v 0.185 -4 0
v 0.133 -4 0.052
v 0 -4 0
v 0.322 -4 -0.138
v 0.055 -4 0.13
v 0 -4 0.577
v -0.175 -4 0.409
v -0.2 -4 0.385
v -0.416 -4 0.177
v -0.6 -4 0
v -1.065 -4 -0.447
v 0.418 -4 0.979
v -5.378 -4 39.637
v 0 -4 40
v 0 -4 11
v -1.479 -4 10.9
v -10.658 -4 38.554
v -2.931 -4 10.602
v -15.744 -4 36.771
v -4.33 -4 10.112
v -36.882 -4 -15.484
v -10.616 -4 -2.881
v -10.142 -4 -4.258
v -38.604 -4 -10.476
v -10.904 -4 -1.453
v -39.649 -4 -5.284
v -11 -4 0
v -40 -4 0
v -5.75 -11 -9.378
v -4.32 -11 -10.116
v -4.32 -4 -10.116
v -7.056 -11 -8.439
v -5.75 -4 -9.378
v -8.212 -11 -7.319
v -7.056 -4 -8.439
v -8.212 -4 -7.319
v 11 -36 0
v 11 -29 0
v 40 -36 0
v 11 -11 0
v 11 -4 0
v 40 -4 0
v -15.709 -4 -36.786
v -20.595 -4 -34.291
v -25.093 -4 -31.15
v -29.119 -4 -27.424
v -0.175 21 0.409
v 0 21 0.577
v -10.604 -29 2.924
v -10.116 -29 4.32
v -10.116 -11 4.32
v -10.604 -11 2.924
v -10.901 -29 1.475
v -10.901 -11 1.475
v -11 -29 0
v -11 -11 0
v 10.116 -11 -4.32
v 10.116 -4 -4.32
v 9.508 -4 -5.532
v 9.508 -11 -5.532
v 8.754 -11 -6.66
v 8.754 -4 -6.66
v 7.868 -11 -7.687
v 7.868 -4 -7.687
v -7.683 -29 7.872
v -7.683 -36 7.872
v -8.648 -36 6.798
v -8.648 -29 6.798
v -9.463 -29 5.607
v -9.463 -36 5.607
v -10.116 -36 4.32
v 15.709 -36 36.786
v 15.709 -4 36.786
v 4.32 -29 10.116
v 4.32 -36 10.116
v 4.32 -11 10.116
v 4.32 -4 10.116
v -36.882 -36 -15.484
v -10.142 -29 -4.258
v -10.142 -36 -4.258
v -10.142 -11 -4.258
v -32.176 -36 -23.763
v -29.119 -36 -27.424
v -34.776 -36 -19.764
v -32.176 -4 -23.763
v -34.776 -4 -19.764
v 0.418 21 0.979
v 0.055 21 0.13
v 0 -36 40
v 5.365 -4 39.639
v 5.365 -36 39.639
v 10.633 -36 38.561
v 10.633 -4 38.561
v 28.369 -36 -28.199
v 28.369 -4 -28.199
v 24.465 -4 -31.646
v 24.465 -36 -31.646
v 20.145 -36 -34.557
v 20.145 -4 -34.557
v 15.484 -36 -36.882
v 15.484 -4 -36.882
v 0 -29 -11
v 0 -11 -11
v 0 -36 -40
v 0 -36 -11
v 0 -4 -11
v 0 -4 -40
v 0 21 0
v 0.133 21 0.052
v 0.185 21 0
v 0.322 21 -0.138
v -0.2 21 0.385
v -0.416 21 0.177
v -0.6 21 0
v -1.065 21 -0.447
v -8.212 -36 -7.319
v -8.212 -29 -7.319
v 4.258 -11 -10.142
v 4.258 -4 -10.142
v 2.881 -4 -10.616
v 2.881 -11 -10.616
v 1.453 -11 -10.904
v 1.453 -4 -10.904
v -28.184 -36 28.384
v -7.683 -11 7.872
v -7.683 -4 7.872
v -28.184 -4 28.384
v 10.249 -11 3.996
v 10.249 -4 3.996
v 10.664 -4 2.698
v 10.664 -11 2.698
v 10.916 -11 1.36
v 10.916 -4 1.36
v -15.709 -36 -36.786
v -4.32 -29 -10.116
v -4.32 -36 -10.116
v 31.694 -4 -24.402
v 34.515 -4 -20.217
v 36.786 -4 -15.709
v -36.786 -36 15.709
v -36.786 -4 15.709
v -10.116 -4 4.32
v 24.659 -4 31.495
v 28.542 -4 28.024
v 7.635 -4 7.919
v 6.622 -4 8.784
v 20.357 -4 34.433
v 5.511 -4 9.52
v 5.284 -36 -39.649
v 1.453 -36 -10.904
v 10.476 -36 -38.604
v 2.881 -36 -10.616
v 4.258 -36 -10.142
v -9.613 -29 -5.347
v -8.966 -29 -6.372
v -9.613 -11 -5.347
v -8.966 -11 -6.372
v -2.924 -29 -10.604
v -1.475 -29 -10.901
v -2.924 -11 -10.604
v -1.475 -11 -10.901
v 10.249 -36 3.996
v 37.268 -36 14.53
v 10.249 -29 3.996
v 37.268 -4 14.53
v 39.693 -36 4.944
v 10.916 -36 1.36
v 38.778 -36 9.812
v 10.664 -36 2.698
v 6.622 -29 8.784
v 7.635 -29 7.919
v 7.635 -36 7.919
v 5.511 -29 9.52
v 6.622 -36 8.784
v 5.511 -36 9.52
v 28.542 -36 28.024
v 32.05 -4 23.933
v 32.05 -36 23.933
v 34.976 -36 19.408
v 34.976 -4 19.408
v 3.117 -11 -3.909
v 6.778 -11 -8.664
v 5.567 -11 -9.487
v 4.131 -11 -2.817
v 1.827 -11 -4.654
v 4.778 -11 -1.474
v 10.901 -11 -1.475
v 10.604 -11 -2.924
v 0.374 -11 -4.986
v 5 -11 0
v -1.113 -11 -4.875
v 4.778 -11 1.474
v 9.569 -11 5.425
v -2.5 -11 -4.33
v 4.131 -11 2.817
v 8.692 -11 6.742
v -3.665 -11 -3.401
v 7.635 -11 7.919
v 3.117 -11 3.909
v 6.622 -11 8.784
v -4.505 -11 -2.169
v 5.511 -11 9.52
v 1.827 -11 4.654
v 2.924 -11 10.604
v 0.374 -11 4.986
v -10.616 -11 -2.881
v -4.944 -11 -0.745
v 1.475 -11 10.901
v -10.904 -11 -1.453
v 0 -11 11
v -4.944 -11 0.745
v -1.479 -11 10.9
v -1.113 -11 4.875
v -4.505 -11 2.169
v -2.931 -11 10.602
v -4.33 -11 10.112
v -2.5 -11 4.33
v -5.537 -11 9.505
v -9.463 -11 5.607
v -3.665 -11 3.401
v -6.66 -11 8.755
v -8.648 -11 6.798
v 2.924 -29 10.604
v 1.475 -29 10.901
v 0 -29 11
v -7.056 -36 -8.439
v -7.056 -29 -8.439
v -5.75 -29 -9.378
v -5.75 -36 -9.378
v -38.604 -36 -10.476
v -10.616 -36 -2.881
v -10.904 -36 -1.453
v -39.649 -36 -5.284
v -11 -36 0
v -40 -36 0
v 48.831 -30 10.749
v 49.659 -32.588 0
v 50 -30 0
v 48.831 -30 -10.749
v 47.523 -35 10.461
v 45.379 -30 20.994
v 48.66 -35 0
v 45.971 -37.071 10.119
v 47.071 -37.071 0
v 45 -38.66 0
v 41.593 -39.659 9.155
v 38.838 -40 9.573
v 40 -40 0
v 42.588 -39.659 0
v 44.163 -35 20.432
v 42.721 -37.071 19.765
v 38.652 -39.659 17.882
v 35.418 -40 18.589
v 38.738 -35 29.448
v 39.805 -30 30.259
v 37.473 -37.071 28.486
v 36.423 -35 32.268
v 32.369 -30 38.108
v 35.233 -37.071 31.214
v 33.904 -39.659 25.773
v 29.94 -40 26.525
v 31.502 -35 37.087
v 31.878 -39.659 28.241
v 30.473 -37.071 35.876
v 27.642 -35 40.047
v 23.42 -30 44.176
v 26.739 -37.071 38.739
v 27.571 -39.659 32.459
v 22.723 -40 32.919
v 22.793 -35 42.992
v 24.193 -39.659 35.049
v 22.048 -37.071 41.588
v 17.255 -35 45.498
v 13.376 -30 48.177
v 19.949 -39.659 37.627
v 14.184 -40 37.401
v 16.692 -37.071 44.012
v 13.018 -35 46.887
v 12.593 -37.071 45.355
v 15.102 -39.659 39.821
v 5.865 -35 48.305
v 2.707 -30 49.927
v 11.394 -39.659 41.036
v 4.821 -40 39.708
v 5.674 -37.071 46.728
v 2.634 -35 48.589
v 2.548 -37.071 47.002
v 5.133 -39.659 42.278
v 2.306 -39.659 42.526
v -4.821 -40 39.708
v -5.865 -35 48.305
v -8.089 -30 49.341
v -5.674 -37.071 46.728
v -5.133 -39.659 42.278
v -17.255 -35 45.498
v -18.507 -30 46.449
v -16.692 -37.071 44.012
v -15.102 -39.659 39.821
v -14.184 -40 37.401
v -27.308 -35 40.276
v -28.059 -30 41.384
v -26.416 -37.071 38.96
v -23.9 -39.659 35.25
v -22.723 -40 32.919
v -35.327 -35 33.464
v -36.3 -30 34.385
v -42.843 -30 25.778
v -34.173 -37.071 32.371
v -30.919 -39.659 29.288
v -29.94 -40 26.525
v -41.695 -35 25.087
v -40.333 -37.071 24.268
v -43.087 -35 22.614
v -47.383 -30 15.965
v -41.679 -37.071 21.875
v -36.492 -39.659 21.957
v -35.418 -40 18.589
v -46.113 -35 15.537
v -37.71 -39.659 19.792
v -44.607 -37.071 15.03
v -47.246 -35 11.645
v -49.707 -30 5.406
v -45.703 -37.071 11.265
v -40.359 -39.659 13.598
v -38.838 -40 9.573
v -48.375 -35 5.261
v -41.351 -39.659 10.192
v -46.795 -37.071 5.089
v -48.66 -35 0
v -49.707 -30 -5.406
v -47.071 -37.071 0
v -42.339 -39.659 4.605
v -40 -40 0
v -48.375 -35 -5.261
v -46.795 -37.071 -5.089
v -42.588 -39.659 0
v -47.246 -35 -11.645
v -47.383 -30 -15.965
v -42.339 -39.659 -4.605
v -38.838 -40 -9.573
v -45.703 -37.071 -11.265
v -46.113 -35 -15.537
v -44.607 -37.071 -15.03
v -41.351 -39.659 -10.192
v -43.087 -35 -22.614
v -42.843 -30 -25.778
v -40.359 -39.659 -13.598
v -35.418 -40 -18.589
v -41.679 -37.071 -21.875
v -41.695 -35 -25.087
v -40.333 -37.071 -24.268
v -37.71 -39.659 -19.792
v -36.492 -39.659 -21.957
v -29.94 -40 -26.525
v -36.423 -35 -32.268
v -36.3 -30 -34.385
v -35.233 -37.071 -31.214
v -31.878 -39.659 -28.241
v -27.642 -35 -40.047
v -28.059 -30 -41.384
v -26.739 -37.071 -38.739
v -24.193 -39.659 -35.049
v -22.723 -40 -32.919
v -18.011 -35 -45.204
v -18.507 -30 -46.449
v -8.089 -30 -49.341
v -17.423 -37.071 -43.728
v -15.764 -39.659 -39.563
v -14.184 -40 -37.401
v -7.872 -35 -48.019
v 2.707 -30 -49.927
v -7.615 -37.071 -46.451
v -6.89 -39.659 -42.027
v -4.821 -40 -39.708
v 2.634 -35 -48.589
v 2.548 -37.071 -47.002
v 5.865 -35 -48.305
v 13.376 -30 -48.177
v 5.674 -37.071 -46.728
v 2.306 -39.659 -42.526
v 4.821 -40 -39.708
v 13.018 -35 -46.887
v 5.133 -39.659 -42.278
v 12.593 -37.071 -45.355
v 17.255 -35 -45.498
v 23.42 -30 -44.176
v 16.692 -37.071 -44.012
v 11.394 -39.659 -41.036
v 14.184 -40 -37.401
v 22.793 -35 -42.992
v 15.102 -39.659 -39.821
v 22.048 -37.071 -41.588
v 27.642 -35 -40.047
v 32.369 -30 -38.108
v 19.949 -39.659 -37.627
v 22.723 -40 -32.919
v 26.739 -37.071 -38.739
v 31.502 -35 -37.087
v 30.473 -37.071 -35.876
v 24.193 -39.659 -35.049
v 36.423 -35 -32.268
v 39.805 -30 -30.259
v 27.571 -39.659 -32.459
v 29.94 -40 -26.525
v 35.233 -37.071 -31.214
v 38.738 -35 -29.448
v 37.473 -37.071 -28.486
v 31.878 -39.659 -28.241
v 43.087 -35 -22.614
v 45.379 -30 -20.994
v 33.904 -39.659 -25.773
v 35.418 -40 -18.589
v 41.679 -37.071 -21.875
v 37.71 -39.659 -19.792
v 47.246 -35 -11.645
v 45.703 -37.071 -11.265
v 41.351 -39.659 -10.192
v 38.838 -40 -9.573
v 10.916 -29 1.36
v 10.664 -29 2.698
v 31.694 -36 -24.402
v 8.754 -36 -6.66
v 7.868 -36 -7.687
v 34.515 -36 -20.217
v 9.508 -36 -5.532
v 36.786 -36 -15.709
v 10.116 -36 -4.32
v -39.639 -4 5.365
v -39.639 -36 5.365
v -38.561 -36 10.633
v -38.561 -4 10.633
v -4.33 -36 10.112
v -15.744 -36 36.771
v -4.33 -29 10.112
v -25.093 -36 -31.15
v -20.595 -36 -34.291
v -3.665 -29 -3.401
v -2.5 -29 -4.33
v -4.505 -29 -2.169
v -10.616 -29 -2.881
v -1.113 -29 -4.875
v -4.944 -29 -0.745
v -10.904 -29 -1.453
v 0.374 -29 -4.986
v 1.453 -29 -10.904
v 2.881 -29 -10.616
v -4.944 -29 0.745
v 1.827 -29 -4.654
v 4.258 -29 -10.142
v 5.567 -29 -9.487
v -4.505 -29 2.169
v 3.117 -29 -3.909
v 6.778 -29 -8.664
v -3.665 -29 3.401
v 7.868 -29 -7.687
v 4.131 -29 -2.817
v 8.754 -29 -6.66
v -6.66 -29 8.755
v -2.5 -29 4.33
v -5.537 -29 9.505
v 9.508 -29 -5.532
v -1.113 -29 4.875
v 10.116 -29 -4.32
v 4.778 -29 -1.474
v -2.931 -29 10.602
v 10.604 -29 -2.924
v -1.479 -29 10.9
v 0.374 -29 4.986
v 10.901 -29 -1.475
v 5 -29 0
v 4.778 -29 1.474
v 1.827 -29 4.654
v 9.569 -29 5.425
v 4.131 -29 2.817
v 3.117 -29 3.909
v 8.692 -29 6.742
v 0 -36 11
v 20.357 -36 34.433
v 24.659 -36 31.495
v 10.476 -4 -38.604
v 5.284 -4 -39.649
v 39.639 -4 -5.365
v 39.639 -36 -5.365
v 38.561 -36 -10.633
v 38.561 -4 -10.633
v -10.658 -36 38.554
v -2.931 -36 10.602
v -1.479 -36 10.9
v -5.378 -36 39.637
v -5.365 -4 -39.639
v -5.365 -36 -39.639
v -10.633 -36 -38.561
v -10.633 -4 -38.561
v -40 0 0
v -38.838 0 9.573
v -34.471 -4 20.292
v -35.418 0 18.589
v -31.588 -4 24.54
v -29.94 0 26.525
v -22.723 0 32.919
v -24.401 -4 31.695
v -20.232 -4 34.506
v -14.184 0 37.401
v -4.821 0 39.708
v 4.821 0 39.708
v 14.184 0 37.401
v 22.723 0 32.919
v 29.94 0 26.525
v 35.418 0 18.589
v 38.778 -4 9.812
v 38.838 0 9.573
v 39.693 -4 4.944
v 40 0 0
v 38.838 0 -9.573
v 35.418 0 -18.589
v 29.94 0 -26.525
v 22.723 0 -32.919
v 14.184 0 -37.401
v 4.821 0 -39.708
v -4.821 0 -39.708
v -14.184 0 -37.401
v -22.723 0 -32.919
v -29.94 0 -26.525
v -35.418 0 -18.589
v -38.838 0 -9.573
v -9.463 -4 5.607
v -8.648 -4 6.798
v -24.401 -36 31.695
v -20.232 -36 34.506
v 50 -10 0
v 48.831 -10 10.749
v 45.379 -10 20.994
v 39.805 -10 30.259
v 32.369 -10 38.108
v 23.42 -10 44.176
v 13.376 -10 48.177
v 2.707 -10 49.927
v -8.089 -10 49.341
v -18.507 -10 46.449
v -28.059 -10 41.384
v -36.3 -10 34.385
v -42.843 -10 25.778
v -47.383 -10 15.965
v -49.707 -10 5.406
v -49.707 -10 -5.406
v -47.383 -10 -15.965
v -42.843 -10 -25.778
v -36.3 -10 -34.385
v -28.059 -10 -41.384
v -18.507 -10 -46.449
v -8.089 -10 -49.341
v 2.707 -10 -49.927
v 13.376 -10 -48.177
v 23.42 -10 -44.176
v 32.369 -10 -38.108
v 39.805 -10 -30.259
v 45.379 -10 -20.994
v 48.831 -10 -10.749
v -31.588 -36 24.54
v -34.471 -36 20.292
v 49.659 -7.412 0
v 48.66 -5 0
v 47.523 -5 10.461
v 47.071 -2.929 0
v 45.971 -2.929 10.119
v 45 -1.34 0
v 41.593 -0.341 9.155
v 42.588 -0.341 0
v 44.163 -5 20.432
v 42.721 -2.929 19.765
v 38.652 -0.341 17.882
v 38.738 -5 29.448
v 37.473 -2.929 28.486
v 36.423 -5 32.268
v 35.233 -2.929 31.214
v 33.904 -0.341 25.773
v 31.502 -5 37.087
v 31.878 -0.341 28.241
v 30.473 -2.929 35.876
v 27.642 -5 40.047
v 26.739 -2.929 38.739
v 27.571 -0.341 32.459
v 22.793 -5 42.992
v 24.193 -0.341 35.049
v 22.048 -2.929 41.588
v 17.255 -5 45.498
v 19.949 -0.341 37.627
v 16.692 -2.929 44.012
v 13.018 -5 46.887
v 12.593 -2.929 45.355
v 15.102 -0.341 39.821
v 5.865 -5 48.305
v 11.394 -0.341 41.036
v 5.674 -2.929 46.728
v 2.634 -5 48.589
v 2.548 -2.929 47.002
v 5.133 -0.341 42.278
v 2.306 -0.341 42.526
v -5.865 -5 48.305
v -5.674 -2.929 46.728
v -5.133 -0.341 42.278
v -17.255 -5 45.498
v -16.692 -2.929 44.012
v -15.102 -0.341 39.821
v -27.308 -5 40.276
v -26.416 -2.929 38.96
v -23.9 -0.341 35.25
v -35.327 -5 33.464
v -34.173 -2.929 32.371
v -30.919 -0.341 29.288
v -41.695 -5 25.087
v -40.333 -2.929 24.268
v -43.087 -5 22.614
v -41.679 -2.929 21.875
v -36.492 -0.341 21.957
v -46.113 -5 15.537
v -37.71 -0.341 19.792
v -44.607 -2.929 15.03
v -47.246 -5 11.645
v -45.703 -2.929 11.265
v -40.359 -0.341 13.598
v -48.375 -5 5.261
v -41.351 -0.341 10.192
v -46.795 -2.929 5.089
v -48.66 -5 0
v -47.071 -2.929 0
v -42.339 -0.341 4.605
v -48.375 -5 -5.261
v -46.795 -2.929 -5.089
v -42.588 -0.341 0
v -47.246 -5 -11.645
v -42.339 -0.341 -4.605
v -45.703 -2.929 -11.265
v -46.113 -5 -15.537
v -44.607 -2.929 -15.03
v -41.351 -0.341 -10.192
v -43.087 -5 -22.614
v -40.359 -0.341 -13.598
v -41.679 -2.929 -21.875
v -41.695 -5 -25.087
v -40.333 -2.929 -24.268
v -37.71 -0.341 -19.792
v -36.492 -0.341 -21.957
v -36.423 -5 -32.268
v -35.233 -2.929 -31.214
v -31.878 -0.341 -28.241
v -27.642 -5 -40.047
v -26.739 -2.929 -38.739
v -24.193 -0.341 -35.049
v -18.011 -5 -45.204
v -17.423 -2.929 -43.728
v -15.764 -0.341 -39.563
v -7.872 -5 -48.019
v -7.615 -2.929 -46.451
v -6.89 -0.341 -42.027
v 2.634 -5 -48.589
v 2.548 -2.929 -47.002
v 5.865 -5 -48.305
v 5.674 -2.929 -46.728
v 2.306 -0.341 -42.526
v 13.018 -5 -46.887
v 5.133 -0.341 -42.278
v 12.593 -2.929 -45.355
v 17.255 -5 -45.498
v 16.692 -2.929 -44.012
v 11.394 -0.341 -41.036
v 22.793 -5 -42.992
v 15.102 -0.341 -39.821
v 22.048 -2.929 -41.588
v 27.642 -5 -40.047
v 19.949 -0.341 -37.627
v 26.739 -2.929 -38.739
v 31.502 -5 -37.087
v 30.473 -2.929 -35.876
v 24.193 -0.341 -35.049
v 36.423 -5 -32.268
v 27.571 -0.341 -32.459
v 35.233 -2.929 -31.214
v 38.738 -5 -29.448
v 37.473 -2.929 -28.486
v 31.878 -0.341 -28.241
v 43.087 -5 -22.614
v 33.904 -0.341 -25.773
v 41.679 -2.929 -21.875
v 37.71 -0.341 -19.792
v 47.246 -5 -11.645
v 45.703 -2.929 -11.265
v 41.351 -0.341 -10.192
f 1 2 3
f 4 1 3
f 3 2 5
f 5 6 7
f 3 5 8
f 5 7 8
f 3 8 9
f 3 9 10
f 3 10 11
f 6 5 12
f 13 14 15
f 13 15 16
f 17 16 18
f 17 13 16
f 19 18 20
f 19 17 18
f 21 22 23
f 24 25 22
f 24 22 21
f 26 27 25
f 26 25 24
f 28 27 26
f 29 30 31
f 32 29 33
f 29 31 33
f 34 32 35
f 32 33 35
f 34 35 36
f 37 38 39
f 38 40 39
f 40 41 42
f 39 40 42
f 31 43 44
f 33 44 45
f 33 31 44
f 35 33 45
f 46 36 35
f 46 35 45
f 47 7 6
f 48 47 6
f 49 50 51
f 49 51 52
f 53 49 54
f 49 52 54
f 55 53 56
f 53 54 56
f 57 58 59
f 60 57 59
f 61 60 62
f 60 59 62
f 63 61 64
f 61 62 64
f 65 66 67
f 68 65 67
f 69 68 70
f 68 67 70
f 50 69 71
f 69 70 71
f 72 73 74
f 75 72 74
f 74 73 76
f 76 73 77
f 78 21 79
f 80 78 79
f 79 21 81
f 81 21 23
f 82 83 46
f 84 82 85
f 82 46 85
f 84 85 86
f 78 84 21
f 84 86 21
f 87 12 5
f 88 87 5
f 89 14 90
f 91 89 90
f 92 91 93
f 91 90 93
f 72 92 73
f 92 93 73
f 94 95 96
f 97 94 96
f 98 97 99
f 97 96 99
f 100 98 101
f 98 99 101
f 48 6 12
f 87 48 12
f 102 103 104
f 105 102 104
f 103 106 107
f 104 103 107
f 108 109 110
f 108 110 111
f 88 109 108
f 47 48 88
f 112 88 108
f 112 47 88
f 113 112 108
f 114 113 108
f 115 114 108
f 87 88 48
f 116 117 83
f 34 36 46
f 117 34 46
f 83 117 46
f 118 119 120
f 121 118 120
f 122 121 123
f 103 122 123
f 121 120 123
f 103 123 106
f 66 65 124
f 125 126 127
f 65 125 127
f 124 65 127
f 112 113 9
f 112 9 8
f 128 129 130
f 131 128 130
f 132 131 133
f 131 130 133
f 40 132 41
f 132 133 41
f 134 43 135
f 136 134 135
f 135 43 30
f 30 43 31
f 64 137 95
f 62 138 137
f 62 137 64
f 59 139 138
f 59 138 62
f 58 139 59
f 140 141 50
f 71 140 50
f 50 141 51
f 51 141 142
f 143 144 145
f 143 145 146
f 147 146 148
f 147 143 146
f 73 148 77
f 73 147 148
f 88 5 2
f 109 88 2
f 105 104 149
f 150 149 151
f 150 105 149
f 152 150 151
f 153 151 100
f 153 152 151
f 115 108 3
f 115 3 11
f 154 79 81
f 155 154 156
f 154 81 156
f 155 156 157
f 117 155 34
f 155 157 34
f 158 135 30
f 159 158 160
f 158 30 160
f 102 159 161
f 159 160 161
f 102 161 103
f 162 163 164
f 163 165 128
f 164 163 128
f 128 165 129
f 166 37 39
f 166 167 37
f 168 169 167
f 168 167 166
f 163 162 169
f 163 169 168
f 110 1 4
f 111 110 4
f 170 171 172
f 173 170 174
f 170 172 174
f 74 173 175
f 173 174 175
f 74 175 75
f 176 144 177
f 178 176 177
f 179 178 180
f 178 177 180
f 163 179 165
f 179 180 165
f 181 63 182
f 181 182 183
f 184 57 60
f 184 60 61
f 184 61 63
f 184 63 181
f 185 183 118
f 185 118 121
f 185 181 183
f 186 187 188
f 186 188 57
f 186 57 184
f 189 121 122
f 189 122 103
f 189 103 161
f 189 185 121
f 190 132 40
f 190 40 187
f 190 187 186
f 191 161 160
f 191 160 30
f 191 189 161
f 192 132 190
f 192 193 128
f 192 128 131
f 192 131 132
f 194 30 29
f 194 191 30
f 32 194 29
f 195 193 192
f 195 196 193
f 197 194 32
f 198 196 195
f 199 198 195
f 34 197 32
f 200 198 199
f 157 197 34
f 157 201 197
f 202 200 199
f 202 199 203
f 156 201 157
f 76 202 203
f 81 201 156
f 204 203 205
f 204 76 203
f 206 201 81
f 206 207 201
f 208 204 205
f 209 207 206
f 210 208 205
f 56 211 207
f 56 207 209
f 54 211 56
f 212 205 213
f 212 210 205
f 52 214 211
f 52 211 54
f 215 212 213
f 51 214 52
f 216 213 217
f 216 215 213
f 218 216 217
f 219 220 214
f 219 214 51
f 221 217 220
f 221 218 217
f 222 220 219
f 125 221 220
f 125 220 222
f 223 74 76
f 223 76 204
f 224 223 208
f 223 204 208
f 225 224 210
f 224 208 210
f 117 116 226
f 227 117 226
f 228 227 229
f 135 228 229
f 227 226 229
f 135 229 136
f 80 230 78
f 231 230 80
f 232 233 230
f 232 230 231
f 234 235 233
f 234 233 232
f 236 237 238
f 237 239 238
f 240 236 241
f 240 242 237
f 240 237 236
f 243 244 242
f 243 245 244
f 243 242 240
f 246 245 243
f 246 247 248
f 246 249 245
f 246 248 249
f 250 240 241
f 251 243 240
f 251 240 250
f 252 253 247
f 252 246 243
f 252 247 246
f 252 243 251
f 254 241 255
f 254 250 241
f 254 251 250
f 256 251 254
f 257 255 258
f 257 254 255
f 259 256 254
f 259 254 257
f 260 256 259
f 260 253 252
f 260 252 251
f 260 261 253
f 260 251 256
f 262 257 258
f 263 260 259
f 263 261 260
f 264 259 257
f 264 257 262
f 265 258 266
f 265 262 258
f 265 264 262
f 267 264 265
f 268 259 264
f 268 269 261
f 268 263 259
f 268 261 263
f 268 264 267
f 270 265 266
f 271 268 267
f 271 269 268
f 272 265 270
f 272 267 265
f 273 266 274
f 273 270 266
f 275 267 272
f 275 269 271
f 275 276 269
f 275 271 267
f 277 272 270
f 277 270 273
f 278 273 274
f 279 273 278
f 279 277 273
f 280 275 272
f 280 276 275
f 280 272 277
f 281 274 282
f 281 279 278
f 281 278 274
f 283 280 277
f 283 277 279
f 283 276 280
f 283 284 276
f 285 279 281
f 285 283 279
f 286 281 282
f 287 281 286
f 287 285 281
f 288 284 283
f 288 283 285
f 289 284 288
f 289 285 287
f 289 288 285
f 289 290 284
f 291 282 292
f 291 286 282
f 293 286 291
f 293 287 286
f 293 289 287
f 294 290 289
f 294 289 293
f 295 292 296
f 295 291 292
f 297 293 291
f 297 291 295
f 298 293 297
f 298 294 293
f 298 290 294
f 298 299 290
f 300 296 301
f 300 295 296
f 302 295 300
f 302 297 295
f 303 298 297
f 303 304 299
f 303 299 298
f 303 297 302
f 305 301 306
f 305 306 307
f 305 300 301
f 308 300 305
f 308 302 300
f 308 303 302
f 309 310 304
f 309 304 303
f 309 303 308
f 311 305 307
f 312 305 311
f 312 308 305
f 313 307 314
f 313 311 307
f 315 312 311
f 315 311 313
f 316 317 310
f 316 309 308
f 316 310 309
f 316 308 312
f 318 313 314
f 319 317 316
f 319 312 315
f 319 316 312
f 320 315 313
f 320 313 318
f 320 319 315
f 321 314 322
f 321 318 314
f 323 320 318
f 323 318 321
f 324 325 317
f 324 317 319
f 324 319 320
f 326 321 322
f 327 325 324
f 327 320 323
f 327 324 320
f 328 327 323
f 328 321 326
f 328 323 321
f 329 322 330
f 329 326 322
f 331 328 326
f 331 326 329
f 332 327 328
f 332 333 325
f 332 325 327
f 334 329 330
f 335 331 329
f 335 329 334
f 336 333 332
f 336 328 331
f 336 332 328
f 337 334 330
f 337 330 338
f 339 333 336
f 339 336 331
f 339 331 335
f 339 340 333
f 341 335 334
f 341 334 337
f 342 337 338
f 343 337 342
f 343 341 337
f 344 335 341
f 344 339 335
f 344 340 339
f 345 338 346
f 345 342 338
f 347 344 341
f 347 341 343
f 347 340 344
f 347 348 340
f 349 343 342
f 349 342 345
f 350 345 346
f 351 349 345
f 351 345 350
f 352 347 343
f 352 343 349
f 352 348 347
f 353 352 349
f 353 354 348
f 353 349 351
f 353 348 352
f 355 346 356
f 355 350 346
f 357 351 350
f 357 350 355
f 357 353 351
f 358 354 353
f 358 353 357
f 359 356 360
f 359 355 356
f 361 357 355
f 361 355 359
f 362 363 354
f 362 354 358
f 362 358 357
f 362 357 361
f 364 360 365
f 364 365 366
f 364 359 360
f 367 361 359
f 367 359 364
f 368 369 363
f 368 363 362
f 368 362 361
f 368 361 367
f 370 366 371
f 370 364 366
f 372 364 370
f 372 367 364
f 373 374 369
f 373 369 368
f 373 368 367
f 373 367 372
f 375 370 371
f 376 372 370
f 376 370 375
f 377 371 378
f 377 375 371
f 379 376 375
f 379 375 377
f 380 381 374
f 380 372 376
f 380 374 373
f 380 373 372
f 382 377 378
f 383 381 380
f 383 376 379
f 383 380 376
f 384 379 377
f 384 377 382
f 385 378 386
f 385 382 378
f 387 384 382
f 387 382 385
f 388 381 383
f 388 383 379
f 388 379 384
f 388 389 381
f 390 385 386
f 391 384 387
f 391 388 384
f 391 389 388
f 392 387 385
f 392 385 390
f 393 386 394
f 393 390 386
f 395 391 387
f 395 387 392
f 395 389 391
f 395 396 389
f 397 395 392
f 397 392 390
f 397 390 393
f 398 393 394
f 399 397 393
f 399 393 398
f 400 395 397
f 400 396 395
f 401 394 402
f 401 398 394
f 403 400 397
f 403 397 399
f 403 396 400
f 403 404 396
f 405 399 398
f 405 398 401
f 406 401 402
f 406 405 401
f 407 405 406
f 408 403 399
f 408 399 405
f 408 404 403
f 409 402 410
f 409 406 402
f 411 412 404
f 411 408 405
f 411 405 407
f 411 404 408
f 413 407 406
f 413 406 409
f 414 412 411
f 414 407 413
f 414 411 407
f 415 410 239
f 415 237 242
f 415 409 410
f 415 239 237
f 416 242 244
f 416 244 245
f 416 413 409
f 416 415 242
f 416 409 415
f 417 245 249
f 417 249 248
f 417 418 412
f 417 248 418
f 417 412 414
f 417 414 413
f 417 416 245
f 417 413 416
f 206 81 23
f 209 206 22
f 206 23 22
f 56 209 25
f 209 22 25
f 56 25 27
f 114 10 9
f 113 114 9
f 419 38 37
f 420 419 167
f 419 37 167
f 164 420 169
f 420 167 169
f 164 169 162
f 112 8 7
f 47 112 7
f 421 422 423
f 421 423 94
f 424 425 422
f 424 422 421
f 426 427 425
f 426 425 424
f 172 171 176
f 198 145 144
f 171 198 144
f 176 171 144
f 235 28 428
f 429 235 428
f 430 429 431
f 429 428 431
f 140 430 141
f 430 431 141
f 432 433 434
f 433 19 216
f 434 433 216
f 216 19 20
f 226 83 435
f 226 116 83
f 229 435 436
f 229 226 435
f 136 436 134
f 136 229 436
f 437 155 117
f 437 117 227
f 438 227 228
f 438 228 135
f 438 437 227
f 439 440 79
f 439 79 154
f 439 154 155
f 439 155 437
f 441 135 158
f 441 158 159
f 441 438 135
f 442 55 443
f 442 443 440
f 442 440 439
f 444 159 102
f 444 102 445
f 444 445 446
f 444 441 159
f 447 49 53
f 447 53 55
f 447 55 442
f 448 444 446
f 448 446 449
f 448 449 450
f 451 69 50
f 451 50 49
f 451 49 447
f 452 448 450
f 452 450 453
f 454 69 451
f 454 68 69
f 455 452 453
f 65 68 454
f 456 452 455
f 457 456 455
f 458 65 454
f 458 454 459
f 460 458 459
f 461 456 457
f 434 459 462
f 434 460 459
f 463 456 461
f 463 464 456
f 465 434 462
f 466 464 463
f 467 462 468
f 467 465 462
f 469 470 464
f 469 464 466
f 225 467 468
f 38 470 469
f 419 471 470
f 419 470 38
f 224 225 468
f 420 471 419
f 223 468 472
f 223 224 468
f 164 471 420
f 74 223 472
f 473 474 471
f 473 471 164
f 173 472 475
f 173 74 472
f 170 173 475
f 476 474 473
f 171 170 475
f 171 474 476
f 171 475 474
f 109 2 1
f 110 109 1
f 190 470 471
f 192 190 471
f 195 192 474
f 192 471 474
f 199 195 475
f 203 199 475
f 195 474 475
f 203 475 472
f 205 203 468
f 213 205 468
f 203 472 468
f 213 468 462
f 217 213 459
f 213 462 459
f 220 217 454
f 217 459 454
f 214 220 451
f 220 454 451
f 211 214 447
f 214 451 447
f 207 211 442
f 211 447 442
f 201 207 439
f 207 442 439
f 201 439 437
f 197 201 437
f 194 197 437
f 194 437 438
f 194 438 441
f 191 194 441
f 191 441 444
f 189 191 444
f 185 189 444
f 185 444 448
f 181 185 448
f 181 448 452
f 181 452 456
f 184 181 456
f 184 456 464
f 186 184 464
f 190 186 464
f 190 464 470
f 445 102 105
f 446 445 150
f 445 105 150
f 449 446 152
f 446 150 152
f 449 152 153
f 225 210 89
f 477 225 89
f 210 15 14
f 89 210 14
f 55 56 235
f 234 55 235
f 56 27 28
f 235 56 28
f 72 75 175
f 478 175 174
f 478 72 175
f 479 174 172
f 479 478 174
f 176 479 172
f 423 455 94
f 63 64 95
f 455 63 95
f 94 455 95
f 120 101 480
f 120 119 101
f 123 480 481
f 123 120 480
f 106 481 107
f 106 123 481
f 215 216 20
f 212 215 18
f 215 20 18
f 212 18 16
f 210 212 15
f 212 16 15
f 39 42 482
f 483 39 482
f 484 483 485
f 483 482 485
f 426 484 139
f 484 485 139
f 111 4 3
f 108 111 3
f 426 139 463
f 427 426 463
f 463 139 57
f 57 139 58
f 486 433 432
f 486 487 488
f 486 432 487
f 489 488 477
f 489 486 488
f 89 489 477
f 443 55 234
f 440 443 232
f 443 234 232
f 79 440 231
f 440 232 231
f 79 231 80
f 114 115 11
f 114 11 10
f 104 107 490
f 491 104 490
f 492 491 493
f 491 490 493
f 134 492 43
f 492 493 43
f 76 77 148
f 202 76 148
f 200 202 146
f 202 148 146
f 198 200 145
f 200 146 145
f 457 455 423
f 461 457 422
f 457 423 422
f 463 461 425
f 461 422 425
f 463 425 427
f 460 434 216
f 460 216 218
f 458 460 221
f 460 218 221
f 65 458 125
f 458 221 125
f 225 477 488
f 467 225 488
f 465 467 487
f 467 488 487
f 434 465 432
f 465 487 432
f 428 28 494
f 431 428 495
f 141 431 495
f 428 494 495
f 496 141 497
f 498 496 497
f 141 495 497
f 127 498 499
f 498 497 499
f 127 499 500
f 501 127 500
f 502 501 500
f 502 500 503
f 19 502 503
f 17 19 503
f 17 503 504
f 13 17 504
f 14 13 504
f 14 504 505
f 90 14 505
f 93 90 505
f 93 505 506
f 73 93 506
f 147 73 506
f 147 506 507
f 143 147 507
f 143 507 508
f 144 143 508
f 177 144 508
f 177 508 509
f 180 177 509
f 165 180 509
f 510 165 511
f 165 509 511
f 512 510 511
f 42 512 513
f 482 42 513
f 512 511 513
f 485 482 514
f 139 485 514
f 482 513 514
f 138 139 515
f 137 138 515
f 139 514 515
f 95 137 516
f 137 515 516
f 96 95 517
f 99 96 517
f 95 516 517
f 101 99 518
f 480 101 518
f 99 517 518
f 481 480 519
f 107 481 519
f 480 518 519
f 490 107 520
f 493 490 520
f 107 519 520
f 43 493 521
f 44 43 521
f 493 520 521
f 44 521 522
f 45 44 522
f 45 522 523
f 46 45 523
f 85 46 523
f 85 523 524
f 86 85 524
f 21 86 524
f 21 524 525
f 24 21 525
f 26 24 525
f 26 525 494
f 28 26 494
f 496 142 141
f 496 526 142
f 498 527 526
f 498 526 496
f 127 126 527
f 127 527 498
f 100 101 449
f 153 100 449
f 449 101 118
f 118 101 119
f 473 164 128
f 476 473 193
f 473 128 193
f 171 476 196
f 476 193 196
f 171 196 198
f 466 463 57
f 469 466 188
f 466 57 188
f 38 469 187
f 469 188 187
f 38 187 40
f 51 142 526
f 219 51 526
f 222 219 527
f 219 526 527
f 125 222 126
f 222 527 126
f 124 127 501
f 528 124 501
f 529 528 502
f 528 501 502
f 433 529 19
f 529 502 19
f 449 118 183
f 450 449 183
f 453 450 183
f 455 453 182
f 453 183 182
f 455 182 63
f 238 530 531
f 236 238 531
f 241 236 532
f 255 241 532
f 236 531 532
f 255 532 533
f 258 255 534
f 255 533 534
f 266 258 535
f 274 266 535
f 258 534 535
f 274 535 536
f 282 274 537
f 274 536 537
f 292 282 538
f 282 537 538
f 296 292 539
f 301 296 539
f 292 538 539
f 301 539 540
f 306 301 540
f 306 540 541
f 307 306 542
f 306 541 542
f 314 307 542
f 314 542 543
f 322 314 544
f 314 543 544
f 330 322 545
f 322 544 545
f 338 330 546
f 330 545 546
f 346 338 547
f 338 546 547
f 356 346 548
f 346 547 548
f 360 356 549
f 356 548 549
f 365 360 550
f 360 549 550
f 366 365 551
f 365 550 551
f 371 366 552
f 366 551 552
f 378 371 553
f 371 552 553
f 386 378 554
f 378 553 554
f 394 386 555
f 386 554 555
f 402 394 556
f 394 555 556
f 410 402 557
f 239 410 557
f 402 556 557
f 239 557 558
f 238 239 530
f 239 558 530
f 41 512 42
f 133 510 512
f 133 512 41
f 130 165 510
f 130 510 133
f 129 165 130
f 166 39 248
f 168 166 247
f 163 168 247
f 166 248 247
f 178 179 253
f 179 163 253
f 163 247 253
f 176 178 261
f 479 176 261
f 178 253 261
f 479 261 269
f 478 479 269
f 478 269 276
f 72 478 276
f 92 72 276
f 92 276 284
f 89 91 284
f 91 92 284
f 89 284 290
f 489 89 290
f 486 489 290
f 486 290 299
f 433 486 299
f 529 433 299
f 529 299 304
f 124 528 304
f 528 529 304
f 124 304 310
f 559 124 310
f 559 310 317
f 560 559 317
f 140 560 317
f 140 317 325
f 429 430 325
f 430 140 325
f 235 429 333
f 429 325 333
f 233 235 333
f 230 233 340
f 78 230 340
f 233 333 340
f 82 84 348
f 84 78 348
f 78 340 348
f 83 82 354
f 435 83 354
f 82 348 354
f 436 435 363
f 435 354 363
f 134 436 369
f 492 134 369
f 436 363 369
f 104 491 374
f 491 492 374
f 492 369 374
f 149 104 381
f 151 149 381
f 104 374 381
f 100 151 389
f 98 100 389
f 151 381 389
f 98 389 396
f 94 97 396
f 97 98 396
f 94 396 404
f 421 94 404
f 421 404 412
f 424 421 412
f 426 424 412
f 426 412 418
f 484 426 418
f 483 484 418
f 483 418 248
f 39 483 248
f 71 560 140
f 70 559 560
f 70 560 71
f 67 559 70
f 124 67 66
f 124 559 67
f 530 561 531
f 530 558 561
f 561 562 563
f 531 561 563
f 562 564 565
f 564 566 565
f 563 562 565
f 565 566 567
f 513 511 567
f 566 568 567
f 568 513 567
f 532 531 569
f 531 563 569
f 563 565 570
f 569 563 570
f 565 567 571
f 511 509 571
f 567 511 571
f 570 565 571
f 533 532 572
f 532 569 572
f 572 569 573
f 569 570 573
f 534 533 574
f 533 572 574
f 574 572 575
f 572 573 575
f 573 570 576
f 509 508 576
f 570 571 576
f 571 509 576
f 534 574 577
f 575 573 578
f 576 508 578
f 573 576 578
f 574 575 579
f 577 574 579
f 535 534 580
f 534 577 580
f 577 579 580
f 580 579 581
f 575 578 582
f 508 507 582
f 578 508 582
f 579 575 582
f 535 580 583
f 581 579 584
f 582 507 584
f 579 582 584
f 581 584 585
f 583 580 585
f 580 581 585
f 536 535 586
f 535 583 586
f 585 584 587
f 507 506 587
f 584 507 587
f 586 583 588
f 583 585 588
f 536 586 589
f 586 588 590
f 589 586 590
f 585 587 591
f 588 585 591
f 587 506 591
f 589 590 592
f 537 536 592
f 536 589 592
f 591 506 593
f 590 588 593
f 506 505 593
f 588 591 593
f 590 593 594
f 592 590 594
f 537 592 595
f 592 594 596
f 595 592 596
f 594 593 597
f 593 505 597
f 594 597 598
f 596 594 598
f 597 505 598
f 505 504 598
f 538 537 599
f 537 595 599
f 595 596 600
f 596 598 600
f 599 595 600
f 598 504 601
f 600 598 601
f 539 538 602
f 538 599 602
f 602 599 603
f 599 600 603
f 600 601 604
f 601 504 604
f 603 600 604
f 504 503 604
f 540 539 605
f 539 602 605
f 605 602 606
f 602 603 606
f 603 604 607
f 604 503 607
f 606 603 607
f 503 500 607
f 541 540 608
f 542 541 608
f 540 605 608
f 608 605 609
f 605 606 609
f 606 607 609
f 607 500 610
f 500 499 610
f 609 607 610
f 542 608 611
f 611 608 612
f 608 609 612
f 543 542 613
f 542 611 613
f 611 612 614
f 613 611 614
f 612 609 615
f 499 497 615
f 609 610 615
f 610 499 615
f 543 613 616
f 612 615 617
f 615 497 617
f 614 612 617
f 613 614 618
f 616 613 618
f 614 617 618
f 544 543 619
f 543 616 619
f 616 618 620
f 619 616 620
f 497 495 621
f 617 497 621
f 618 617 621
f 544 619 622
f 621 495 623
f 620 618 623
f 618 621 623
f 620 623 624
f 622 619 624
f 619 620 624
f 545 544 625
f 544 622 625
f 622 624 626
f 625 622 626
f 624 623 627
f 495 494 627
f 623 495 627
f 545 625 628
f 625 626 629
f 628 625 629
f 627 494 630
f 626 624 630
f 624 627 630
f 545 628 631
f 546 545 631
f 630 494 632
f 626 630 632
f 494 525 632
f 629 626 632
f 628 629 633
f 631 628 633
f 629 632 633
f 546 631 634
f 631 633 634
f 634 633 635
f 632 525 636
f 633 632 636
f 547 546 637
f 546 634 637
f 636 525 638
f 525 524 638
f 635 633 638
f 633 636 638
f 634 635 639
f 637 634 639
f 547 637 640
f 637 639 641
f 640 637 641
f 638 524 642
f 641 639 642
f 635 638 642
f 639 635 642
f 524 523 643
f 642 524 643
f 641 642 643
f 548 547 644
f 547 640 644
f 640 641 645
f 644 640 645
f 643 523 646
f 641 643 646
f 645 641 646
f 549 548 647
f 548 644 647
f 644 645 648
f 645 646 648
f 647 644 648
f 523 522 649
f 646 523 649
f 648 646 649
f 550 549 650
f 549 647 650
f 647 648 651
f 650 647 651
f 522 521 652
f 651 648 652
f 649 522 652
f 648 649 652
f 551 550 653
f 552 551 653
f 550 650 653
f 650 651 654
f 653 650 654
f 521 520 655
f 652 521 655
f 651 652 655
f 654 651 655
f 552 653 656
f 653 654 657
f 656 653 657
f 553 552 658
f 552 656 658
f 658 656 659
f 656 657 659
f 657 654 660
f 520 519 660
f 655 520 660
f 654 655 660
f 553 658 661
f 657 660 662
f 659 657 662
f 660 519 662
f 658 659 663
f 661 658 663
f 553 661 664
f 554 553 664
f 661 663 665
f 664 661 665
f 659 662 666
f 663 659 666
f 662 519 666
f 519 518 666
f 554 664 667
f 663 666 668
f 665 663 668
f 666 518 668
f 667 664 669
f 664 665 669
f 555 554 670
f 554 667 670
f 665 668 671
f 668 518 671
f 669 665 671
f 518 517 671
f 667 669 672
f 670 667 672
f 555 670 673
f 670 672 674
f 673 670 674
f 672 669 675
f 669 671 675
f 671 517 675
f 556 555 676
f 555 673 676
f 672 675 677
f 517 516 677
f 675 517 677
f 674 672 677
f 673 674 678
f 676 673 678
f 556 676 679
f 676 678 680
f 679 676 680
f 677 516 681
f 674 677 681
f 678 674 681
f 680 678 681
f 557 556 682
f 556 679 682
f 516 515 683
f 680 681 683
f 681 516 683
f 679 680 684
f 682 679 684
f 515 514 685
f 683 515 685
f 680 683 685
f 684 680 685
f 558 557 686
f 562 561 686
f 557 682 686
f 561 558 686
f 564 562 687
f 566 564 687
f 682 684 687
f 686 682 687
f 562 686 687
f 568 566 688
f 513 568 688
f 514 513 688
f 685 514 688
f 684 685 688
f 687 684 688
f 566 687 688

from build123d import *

# Parameters (mm, degrees)
F0_R      = 50
F1_DEPTH  = 40
F3_R      = 10
F2_R      = 40
F4_DEPTH  = 4
F5_R      = 40
F6_DEPTH  = 4
F7_R      = 11
F8_DEPTH  = 7
F9_R      = 11
F10_DEPTH = 7
F12_D     = 10
F14_DEPTH = 25
F16_DEPTH = 32


with BuildPart() as f1:
    # F0 (on Front) → F1 (new body)
    with BuildSketch(Plane.XZ):
        Circle(F0_R)
    extrude(amount=F1_DEPTH)

    # F3
    f3_edges = [f1.edges().sort_by_distance(p)[0] for p in [
        (-50, 0, 0),
        (50, -20, 0),
        (-50, -40, 0),
    ]]
    fillet(f3_edges, radius=F3_R)

    # F2 (on face) → F4 (cut)
    with BuildSketch(Plane.XZ.offset(40)):
        Circle(F2_R)
    extrude(amount=-F4_DEPTH, mode=Mode.SUBTRACT)

    # F5 (on face) → F6 (cut)
    with BuildSketch(Plane(origin=(0, 0, 0), x_dir=(-1, 0, 0), z_dir=(0, 1, 0))):
        Circle(F5_R)
    extrude(amount=-F6_DEPTH, mode=Mode.SUBTRACT)

    # F7 (on face) → F8 (cut)
    with BuildSketch(Plane(origin=(0, -4, 0), x_dir=(-1, 0, 0), z_dir=(0, 1, 0))):
        Circle(F7_R)
    extrude(amount=-F8_DEPTH, mode=Mode.SUBTRACT)

    # F9 (on face) → F10 (cut)
    with BuildSketch(Plane.XZ.offset(36)):
        Circle(F9_R)
    extrude(amount=-F10_DEPTH, mode=Mode.SUBTRACT)

    # F12 (through all)
    with Locations(Plane(origin=(0, -4, 0), x_dir=(-1, 0, 0), z_dir=(0, 1, 0))):
        with Locations((0, 0)):
            Hole(F12_D / 2)

    # F15 (on face) + F13 (on face) → F16 (cut, through all)
    with BuildSketch(Plane(origin=(0, -4, 0), x_dir=(-1, 0, 0), z_dir=(0, 1, 0))):
        with BuildLine():
            ThreePointArc((-28.5424011699, 28.0237637632), (-33.5895367831, 21.7196459155), (-37.2675737992, 14.5302423628))
            Line((-37.2675737992, 14.5302423628), (-10.2485827948, 3.9958166498))
            ThreePointArc((-10.2485827948, 3.9958166498), (-9.1543588219, 6.0989929136), (-7.6348977457, 7.9188595399))
            Line((-7.6348977457, 7.9188595399), (-28.5424011699, 28.0237637632))
        make_face()
    with BuildSketch(Plane(origin=(0, -4, 0), x_dir=(-1, 0, 0), z_dir=(0, 1, 0))):
        with BuildLine():
            Line((-36.7860355942, -15.7094743788), (-10.1161597884, -4.3201054542))
            ThreePointArc((-10.1161597884, -4.3201054542), (-10.7767749738, -2.2047950389), (-11, 0))
            Line((-11, 0), (-40, 0))
            ThreePointArc((-40, 0), (-39.1882726321, -8.0174365052), (-36.7860355942, -15.7094743788))
        make_face()
        with BuildLine():
            Line((-15.4837652661, -36.8816080613), (-4.2580354482, -10.1424422168))
            ThreePointArc((-4.2580354482, -10.1424422168), (-6.1860832703, -9.0957338227), (-7.8680698212, -7.6872281928))
            Line((-7.8680698212, -7.6872281928), (-28.3692806361, -28.1990055887))
            ThreePointArc((-28.3692806361, -28.1990055887), (-22.3521655584, -33.1719865979), (-15.4837652661, -36.8816080613))
        make_face()
        with BuildLine():
            Line((15.7094743788, -36.7860355942), (4.3201054542, -10.1161597884))
            ThreePointArc((4.3201054542, -10.1161597884), (2.2047950389, -10.7767749738), (0, -11))
            Line((0, -11), (0, -40))
            ThreePointArc((0, -40), (8.0174365052, -39.1882726321), (15.7094743788, -36.7860355942))
        make_face()
        with BuildLine():
            ThreePointArc((10.1424422168, -4.2580354482), (9.3037407951, -5.8685949951), (8.2115068907, -7.3192318302))
            Line((8.2115068907, -7.3192318302), (29.1190103149, -27.4241360535))
            ThreePointArc((29.1190103149, -27.4241360535), (33.5360033418, -21.8022127284), (36.8816080613, -15.4837652661))
            Line((36.8816080613, -15.4837652661), (10.1424422168, -4.2580354482))
        make_face()
        with BuildLine():
            Line((36.7860355942, 15.7094743788), (10.1161597884, 4.3201054542))
            ThreePointArc((10.1161597884, 4.3201054542), (10.7767749738, 2.2047950389), (11, 0))
            Line((11, 0), (40, 0))
            ThreePointArc((40, 0), (39.1882726321, 8.0174365052), (36.7860355942, 15.7094743788))
        make_face()
        with BuildLine():
            Line((15.7439326676, 36.7713010942), (4.3295814836, 10.1121078009))
            ThreePointArc((4.3295814836, 10.1121078009), (6.1099144323, 9.1470730635), (7.6831729155, 7.8720298494))
            Line((7.6831729155, 7.8720298494), (28.1843837304, 28.3838072453))
            ThreePointArc((28.1843837304, 28.3838072453), (22.360942705, 33.1660706347), (15.7439326676, 36.7713010942))
        make_face()
        with BuildLine():
            Line((-15.7094743788, 36.7860355942), (-4.3201054542, 10.1161597884))
            ThreePointArc((-4.3201054542, 10.1161597884), (-2.2047950389, 10.7767749738), (0, 11))
            Line((0, 11), (0, 40))
            ThreePointArc((0, 40), (-8.0174365052, 39.1882726321), (-15.7094743788, 36.7860355942))
        make_face()
    extrude(amount=-F16_DEPTH, mode=Mode.SUBTRACT)


with BuildPart() as f14:
    # F13 (on face) → F14 (new body)
    with BuildSketch(Plane(origin=(0, -4, 0), x_dir=(-1, 0, 0), z_dir=(0, 1, 0))):
        Polygon((0.6000871668, 0), (0, 0), (1.0650854519, -0.4471478873), align=None)
        Polygon((-0.1848016812, 0), (0, 0), (-0.1329806194, 0.0518477709), align=None)
        Polygon((0, 0.1848969303), (0, 0), (0.1384923008, 0.3234606117), align=None)
        Polygon((-0.1329806194, 0.0518477709), (0, 0), (-0.0553225533, 0.129545863), align=None)
        Polygon((0.1384923008, 0.3234606117), (0, 0), (0.4155446231, 0.1774583073), (0.1998616656, 0.3848616071), align=None)
        Polygon((-0.3224203372, -0.1376895864), (0, 0), (-0.1848016812, 0), align=None)
        Polygon((0.4155446231, 0.1774583073), (0, 0), (0.6000871668, 0), align=None)
        Polygon((-0.0553225533, 0.129545863), (0, 0), (0, 0.1848969303), align=None)
        Polygon((0, 0.1848969303), (0.1384923008, 0.3234606117), (0.1750125609, 0.4087568022), (0, 0.5770509644), align=None)
        Polygon((0.1750125609, 0.4087568022), (0.1384923008, 0.3234606117), (0.1998616656, 0.3848616071), align=None)
        Polygon((-0.4181423928, 0.9791416679), (-0.0553225533, 0.129545863), (0, 0.1848969303), (0, 0.5770509644), align=None)
    extrude(amount=F14_DEPTH)


solid = Compound([f1.part, f14.part])
